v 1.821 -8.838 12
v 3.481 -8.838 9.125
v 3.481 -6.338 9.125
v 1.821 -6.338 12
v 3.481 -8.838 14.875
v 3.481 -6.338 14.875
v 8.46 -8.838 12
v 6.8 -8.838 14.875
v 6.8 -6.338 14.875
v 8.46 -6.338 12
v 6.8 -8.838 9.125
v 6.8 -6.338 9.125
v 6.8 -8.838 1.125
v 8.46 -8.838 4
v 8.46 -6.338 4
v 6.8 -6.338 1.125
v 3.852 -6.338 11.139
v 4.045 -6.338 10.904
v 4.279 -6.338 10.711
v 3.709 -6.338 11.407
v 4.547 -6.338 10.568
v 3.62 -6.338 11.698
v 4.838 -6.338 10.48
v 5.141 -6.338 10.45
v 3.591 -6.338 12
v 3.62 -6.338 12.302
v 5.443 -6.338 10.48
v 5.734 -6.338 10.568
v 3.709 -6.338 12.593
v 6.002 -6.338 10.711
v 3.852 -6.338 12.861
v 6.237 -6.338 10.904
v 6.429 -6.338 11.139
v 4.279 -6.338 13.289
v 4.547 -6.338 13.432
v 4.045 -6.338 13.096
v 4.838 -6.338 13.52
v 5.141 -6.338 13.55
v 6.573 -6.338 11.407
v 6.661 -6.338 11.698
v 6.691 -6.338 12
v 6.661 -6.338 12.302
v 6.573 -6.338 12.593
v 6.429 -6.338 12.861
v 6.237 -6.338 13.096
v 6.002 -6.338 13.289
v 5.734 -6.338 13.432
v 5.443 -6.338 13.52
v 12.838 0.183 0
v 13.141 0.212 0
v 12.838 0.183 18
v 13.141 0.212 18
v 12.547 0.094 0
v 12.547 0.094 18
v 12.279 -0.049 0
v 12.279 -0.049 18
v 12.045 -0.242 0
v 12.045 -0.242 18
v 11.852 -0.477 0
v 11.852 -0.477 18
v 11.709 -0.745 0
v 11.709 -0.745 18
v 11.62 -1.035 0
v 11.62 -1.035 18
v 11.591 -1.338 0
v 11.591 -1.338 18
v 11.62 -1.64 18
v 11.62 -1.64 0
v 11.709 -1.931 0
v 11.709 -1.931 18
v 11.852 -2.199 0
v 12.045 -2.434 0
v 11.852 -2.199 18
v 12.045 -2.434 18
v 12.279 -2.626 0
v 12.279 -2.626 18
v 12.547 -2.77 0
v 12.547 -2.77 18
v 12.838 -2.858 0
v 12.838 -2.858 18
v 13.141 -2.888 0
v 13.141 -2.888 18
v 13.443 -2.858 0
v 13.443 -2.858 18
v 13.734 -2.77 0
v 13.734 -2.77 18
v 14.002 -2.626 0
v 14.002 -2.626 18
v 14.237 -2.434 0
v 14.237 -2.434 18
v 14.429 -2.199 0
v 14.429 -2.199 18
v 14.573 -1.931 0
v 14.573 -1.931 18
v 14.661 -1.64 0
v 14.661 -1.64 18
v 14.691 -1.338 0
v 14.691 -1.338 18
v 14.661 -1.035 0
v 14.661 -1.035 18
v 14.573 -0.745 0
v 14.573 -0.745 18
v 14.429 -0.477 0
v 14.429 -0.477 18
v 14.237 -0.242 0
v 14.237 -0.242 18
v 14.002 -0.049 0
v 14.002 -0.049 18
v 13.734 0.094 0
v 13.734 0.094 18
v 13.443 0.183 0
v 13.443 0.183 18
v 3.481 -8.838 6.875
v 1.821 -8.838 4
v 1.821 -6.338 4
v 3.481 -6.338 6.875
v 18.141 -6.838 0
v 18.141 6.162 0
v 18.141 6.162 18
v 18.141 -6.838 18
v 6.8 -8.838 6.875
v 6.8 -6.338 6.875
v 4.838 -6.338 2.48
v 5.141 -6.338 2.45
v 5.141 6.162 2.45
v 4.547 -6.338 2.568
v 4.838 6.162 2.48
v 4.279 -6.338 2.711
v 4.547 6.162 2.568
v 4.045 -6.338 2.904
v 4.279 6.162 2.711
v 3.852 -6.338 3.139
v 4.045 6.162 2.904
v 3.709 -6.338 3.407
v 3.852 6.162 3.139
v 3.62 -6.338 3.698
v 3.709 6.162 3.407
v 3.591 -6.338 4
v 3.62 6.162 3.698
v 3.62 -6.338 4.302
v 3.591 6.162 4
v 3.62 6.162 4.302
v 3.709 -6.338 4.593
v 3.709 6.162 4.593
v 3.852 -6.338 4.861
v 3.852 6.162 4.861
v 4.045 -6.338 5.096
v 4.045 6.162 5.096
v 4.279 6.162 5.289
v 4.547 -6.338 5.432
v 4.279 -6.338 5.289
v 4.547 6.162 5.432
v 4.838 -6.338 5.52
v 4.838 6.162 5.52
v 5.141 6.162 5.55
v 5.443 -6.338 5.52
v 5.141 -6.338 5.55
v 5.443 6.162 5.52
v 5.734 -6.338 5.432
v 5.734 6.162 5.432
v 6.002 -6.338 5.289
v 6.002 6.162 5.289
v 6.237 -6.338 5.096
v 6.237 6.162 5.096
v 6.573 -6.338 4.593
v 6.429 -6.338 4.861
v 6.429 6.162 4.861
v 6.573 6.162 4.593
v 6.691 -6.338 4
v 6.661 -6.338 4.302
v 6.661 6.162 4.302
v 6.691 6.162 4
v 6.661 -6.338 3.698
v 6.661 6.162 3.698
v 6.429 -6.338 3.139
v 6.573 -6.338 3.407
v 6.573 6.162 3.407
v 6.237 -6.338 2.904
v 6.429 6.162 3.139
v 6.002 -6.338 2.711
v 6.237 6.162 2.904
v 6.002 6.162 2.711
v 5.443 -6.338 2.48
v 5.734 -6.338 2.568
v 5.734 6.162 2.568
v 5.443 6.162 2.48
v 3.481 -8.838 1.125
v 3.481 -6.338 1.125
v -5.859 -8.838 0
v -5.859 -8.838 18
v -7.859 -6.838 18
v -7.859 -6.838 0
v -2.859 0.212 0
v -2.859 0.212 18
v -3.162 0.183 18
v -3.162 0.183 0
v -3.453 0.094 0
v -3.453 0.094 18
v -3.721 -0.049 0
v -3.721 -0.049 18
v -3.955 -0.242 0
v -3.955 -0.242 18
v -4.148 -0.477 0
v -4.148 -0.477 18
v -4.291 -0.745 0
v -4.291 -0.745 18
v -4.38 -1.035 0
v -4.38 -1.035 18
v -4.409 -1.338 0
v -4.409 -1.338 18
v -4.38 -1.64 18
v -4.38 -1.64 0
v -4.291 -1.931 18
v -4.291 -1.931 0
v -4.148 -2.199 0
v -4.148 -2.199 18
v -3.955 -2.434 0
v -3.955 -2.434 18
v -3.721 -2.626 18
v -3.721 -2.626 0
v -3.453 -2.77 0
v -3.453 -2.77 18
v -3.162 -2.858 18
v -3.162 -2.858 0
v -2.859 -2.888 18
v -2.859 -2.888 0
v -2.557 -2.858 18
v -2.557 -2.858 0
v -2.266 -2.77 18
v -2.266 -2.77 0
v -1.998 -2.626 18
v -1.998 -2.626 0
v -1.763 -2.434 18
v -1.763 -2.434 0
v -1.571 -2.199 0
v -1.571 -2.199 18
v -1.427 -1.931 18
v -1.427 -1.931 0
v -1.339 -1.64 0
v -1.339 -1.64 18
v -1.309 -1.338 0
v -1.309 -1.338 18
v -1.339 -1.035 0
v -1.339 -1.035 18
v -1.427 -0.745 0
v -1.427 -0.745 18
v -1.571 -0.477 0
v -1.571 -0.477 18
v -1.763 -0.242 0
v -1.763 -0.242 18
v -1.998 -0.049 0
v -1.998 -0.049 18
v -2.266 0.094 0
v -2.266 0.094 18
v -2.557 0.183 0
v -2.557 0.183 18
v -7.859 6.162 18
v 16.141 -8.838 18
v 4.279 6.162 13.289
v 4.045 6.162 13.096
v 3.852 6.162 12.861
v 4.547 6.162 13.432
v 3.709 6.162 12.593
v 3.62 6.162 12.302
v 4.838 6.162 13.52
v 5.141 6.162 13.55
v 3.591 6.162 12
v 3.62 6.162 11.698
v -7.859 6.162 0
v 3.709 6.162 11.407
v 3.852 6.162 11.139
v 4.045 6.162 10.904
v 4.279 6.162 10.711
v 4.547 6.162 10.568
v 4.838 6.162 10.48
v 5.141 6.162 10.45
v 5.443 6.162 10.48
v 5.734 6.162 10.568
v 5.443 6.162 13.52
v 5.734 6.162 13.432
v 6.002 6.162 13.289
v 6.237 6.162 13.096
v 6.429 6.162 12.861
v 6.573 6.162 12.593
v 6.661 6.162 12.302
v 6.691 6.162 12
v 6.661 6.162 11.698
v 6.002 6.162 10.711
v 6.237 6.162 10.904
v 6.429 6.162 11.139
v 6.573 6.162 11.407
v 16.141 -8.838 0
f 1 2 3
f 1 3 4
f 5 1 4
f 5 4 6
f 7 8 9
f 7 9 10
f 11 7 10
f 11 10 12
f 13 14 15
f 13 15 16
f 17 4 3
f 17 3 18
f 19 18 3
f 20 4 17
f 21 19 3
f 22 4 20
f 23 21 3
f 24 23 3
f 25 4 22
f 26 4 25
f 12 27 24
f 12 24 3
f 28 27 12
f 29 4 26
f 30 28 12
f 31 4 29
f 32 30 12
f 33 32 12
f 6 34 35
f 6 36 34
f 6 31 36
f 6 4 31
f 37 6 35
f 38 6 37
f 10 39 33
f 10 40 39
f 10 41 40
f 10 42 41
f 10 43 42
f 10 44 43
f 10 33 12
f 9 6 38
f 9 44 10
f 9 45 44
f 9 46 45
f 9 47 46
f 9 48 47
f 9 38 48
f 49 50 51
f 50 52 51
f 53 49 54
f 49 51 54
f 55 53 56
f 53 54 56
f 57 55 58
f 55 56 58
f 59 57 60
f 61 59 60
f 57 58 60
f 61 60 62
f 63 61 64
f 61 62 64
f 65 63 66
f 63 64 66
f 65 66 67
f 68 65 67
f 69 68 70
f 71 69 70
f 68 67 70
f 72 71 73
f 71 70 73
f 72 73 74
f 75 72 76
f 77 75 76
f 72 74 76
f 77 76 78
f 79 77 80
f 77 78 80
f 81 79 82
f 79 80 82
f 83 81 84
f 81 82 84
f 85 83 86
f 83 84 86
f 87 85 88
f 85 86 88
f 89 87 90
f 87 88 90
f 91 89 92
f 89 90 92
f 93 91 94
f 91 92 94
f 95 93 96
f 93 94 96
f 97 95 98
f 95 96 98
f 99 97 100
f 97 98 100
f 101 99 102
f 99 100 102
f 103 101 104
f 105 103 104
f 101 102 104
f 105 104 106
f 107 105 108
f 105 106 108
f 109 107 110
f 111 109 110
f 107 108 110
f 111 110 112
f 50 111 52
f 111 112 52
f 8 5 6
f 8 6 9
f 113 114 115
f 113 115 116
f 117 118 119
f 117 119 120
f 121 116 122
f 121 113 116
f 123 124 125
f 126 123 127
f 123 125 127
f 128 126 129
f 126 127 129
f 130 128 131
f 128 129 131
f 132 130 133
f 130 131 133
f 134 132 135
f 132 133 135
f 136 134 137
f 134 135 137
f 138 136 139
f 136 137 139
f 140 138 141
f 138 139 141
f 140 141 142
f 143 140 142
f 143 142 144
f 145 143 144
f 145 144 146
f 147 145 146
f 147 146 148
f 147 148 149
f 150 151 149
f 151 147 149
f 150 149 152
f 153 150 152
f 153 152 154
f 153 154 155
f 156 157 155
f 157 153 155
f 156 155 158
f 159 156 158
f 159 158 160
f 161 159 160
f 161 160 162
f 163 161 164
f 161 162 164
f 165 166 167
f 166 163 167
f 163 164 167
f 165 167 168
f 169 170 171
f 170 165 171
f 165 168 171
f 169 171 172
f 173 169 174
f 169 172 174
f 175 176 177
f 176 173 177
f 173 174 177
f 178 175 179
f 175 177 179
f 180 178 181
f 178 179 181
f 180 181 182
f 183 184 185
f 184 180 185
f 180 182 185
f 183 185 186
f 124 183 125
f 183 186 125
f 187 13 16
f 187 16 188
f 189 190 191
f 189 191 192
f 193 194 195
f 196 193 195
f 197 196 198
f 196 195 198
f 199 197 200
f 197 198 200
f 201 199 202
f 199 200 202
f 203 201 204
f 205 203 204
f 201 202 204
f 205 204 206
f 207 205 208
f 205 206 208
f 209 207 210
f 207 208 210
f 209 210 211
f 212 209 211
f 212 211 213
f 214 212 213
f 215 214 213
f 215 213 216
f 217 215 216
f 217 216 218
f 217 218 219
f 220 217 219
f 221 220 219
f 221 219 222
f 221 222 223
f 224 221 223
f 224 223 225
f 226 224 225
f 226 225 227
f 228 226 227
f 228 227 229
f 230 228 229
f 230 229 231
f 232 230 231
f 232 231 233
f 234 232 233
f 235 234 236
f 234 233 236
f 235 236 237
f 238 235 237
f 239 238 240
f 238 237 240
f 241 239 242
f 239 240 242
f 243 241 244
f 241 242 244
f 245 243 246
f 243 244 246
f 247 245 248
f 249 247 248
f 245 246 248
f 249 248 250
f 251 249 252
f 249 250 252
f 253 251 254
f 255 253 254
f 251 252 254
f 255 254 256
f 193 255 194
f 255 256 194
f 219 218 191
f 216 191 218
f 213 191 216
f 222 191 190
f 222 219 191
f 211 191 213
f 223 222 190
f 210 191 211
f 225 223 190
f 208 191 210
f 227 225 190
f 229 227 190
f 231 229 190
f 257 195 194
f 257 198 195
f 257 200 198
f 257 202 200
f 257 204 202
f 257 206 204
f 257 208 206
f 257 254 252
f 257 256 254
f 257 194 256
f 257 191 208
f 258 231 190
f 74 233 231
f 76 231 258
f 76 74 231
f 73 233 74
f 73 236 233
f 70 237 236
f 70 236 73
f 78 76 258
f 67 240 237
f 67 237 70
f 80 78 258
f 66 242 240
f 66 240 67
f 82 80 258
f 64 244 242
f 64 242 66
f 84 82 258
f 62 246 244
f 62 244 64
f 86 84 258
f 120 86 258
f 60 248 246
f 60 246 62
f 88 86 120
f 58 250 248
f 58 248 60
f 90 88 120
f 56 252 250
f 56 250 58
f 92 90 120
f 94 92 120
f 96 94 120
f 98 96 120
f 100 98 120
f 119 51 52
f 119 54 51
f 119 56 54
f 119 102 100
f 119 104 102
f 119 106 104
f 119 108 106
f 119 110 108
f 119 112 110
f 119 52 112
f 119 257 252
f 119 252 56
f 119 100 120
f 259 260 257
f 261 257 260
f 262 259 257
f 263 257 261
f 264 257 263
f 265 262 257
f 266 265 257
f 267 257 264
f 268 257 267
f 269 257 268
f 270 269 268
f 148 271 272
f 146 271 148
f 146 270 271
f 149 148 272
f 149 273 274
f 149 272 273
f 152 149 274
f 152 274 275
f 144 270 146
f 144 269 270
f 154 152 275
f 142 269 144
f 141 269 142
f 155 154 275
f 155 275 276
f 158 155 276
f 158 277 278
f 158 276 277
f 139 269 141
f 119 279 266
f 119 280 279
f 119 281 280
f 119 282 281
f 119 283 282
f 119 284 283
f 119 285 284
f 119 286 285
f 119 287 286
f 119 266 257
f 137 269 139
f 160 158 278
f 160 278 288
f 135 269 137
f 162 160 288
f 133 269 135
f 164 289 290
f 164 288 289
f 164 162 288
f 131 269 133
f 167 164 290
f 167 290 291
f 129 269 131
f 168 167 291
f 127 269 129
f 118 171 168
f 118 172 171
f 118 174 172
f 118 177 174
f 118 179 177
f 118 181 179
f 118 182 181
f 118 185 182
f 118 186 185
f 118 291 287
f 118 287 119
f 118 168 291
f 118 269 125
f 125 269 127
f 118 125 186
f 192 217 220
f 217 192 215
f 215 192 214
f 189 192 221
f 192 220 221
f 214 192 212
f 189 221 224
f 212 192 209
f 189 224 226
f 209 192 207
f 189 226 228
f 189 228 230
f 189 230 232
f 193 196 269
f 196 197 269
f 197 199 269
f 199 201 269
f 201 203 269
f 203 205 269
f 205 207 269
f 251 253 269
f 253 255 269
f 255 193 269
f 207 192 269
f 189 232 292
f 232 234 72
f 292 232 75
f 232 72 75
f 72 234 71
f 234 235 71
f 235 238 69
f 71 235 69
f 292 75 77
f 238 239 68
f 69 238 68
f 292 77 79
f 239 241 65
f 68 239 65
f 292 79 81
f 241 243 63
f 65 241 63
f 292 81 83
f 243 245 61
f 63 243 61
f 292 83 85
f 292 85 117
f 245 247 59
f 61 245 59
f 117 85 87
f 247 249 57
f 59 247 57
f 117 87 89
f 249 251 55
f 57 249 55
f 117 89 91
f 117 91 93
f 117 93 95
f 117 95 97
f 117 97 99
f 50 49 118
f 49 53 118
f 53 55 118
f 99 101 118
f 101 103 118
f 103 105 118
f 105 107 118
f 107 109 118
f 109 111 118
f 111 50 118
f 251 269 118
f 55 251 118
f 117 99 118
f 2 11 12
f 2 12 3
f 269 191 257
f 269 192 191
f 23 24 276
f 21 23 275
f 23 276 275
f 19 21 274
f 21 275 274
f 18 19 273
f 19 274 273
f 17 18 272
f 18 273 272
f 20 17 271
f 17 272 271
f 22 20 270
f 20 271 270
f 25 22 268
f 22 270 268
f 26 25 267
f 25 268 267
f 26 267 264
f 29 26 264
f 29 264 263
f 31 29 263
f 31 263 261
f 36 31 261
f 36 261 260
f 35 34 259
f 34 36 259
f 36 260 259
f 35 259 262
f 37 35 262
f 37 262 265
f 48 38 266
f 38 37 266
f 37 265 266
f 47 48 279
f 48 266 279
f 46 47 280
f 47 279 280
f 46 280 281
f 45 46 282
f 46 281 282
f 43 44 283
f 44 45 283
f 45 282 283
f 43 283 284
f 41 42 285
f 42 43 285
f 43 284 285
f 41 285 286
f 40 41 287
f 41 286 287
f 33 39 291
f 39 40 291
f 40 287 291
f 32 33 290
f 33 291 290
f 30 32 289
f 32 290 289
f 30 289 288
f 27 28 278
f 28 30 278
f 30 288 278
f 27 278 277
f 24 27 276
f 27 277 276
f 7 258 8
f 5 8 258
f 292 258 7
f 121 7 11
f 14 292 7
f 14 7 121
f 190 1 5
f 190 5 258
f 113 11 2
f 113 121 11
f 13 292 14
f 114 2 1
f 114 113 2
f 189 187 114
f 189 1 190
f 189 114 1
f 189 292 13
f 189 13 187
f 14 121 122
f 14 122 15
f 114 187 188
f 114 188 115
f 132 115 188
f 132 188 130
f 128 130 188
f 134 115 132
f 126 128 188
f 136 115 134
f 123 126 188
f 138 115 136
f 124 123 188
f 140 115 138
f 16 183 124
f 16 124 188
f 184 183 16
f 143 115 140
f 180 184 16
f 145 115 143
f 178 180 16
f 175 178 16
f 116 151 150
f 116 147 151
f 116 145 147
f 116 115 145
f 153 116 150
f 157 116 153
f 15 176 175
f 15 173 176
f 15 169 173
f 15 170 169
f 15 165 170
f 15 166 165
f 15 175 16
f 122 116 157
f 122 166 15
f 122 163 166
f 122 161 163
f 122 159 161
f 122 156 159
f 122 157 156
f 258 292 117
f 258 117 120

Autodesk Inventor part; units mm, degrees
ref_plane "YZ Plane" through (0, 0, 0) normal (1, 0, 0) x (0, 1, 0)
ref_plane "XZ Plane" through (0, 0, 0) normal (0, 1, 0) x (-1, 0, 0)
ref_plane "XY Plane" through (0, 0, 0) normal (0, 0, 1) x (1, 0, 0)
sketch "Szkic1" plane through (0, 0, 0) normal (0, 0, 1) x (1, 0, 0)
  line L0 (-7.8594, 6.1623) -> (18.1406, 6.1623)
  line L1 (18.1406, 6.1623) -> (18.1406, -8.8377)
  line L2 (18.1406, -8.8377) -> (-7.8594, -8.8377)
  line L3 (-7.8594, -8.8377) -> (-7.8594, 6.1623)
  point P0 (0, 0)
  point P1 (-2.8594, -1.3377)
  point P2 (13.1406, -1.3377)
  dimension "d0" = 26
  dimension "d1" = 15
  dimension "d4" = 7.5
  dimension "d5" = 7.5
  dimension "d6" = 5
  dimension "d7" = 5
extrude "Wyciągnięcie proste1" add sketch "Szkic1" along normal blind 18
hole "Otwór1" at (-2.8594, -1.3377, 0) at (13.1406, -1.3377, 0) direction (0, 0, 1) diameter 3.1 end through all
sketch "Szkic2" plane through (-7.8594, -8.8377, 0) normal (0, -1, 0) x (1, 0, 0)
  line L0 (26, 0) -> (0, 0) projected
  line L1 (26, 0) -> (26, 18) projected
  line L2 (0, 18) -> (26, 18) projected
  line L3 (0, 0) -> (0, 18) projected
  point P0 (7.8594, 0)
  point P1 (13, 12)
  point P2 (13, 4)
  dimension "d16" = 8
  dimension "d17" = 13
  dimension "d18" = 26
  dimension "d19" = 13
  dimension "d27" = 4
hole "Otwór2" at (5.1406, -8.8377, 12) at (5.1406, -8.8377, 4) direction (0, 1, 0) diameter 3.1 end through all
chamfer "Faza2" distance 2 angle 45 2 edges at (-7.8594, -8.8377, 9) (18.1406, -8.8377, 9)
sketch "Szkic4" plane through (-5.8594, -8.8377, 0) normal (0, -1, 0) x (1, 0, 0)
  line L0 (22, 18) -> (22, 0) projected
  line L1 (0, 18) -> (22, 18) projected
  line L2 (0, 0) -> (0, 18) projected
  line L3 (22, 0) -> (0, 0) projected
  circle A0 centre (11, 12) radius 1.55 projected
  circle A1 centre (11, 4) radius 1.55 projected
  line L4 (12.6599, 14.875) -> (14.3198, 12)
  line L5 (14.3198, 12) -> (12.6599, 9.125)
  line L6 (12.6599, 9.125) -> (9.3401, 9.125)
  line L7 (9.3401, 9.125) -> (7.6802, 12)
  line L8 (7.6802, 12) -> (9.3401, 14.875)
  line L9 (9.3401, 14.875) -> (12.6599, 14.875)
  line L10 (12.6599, 6.875) -> (14.3198, 4)
  line L11 (14.3198, 4) -> (12.6599, 1.125)
  line L12 (12.6599, 1.125) -> (9.3401, 1.125)
  line L13 (9.3401, 1.125) -> (7.6802, 4)
  line L14 (7.6802, 4) -> (9.3401, 6.875)
  line L15 (9.3401, 6.875) -> (12.6599, 6.875)
  point P0 (5.8594, 0)
  point P1 (11, 14.875)
  point P2 (11, 6.875)
extrude "Wyciągnięcie proste3" cut sketch "Szkic4" against normal blind 2.5 contours L4 L5 L6 L7 L8 L9 | L10 L11 L12 L13 L14 L15
equation "\"d4\" = 0.5 * d1"
equation "\"d5\" = d4"
equation "\"d17\" = 0.5 * d18"
equation "\"d19\" = d17"
properties part number "3DP_ABS_Z_Axis_IGUS_Cable_Chain_Mount"
